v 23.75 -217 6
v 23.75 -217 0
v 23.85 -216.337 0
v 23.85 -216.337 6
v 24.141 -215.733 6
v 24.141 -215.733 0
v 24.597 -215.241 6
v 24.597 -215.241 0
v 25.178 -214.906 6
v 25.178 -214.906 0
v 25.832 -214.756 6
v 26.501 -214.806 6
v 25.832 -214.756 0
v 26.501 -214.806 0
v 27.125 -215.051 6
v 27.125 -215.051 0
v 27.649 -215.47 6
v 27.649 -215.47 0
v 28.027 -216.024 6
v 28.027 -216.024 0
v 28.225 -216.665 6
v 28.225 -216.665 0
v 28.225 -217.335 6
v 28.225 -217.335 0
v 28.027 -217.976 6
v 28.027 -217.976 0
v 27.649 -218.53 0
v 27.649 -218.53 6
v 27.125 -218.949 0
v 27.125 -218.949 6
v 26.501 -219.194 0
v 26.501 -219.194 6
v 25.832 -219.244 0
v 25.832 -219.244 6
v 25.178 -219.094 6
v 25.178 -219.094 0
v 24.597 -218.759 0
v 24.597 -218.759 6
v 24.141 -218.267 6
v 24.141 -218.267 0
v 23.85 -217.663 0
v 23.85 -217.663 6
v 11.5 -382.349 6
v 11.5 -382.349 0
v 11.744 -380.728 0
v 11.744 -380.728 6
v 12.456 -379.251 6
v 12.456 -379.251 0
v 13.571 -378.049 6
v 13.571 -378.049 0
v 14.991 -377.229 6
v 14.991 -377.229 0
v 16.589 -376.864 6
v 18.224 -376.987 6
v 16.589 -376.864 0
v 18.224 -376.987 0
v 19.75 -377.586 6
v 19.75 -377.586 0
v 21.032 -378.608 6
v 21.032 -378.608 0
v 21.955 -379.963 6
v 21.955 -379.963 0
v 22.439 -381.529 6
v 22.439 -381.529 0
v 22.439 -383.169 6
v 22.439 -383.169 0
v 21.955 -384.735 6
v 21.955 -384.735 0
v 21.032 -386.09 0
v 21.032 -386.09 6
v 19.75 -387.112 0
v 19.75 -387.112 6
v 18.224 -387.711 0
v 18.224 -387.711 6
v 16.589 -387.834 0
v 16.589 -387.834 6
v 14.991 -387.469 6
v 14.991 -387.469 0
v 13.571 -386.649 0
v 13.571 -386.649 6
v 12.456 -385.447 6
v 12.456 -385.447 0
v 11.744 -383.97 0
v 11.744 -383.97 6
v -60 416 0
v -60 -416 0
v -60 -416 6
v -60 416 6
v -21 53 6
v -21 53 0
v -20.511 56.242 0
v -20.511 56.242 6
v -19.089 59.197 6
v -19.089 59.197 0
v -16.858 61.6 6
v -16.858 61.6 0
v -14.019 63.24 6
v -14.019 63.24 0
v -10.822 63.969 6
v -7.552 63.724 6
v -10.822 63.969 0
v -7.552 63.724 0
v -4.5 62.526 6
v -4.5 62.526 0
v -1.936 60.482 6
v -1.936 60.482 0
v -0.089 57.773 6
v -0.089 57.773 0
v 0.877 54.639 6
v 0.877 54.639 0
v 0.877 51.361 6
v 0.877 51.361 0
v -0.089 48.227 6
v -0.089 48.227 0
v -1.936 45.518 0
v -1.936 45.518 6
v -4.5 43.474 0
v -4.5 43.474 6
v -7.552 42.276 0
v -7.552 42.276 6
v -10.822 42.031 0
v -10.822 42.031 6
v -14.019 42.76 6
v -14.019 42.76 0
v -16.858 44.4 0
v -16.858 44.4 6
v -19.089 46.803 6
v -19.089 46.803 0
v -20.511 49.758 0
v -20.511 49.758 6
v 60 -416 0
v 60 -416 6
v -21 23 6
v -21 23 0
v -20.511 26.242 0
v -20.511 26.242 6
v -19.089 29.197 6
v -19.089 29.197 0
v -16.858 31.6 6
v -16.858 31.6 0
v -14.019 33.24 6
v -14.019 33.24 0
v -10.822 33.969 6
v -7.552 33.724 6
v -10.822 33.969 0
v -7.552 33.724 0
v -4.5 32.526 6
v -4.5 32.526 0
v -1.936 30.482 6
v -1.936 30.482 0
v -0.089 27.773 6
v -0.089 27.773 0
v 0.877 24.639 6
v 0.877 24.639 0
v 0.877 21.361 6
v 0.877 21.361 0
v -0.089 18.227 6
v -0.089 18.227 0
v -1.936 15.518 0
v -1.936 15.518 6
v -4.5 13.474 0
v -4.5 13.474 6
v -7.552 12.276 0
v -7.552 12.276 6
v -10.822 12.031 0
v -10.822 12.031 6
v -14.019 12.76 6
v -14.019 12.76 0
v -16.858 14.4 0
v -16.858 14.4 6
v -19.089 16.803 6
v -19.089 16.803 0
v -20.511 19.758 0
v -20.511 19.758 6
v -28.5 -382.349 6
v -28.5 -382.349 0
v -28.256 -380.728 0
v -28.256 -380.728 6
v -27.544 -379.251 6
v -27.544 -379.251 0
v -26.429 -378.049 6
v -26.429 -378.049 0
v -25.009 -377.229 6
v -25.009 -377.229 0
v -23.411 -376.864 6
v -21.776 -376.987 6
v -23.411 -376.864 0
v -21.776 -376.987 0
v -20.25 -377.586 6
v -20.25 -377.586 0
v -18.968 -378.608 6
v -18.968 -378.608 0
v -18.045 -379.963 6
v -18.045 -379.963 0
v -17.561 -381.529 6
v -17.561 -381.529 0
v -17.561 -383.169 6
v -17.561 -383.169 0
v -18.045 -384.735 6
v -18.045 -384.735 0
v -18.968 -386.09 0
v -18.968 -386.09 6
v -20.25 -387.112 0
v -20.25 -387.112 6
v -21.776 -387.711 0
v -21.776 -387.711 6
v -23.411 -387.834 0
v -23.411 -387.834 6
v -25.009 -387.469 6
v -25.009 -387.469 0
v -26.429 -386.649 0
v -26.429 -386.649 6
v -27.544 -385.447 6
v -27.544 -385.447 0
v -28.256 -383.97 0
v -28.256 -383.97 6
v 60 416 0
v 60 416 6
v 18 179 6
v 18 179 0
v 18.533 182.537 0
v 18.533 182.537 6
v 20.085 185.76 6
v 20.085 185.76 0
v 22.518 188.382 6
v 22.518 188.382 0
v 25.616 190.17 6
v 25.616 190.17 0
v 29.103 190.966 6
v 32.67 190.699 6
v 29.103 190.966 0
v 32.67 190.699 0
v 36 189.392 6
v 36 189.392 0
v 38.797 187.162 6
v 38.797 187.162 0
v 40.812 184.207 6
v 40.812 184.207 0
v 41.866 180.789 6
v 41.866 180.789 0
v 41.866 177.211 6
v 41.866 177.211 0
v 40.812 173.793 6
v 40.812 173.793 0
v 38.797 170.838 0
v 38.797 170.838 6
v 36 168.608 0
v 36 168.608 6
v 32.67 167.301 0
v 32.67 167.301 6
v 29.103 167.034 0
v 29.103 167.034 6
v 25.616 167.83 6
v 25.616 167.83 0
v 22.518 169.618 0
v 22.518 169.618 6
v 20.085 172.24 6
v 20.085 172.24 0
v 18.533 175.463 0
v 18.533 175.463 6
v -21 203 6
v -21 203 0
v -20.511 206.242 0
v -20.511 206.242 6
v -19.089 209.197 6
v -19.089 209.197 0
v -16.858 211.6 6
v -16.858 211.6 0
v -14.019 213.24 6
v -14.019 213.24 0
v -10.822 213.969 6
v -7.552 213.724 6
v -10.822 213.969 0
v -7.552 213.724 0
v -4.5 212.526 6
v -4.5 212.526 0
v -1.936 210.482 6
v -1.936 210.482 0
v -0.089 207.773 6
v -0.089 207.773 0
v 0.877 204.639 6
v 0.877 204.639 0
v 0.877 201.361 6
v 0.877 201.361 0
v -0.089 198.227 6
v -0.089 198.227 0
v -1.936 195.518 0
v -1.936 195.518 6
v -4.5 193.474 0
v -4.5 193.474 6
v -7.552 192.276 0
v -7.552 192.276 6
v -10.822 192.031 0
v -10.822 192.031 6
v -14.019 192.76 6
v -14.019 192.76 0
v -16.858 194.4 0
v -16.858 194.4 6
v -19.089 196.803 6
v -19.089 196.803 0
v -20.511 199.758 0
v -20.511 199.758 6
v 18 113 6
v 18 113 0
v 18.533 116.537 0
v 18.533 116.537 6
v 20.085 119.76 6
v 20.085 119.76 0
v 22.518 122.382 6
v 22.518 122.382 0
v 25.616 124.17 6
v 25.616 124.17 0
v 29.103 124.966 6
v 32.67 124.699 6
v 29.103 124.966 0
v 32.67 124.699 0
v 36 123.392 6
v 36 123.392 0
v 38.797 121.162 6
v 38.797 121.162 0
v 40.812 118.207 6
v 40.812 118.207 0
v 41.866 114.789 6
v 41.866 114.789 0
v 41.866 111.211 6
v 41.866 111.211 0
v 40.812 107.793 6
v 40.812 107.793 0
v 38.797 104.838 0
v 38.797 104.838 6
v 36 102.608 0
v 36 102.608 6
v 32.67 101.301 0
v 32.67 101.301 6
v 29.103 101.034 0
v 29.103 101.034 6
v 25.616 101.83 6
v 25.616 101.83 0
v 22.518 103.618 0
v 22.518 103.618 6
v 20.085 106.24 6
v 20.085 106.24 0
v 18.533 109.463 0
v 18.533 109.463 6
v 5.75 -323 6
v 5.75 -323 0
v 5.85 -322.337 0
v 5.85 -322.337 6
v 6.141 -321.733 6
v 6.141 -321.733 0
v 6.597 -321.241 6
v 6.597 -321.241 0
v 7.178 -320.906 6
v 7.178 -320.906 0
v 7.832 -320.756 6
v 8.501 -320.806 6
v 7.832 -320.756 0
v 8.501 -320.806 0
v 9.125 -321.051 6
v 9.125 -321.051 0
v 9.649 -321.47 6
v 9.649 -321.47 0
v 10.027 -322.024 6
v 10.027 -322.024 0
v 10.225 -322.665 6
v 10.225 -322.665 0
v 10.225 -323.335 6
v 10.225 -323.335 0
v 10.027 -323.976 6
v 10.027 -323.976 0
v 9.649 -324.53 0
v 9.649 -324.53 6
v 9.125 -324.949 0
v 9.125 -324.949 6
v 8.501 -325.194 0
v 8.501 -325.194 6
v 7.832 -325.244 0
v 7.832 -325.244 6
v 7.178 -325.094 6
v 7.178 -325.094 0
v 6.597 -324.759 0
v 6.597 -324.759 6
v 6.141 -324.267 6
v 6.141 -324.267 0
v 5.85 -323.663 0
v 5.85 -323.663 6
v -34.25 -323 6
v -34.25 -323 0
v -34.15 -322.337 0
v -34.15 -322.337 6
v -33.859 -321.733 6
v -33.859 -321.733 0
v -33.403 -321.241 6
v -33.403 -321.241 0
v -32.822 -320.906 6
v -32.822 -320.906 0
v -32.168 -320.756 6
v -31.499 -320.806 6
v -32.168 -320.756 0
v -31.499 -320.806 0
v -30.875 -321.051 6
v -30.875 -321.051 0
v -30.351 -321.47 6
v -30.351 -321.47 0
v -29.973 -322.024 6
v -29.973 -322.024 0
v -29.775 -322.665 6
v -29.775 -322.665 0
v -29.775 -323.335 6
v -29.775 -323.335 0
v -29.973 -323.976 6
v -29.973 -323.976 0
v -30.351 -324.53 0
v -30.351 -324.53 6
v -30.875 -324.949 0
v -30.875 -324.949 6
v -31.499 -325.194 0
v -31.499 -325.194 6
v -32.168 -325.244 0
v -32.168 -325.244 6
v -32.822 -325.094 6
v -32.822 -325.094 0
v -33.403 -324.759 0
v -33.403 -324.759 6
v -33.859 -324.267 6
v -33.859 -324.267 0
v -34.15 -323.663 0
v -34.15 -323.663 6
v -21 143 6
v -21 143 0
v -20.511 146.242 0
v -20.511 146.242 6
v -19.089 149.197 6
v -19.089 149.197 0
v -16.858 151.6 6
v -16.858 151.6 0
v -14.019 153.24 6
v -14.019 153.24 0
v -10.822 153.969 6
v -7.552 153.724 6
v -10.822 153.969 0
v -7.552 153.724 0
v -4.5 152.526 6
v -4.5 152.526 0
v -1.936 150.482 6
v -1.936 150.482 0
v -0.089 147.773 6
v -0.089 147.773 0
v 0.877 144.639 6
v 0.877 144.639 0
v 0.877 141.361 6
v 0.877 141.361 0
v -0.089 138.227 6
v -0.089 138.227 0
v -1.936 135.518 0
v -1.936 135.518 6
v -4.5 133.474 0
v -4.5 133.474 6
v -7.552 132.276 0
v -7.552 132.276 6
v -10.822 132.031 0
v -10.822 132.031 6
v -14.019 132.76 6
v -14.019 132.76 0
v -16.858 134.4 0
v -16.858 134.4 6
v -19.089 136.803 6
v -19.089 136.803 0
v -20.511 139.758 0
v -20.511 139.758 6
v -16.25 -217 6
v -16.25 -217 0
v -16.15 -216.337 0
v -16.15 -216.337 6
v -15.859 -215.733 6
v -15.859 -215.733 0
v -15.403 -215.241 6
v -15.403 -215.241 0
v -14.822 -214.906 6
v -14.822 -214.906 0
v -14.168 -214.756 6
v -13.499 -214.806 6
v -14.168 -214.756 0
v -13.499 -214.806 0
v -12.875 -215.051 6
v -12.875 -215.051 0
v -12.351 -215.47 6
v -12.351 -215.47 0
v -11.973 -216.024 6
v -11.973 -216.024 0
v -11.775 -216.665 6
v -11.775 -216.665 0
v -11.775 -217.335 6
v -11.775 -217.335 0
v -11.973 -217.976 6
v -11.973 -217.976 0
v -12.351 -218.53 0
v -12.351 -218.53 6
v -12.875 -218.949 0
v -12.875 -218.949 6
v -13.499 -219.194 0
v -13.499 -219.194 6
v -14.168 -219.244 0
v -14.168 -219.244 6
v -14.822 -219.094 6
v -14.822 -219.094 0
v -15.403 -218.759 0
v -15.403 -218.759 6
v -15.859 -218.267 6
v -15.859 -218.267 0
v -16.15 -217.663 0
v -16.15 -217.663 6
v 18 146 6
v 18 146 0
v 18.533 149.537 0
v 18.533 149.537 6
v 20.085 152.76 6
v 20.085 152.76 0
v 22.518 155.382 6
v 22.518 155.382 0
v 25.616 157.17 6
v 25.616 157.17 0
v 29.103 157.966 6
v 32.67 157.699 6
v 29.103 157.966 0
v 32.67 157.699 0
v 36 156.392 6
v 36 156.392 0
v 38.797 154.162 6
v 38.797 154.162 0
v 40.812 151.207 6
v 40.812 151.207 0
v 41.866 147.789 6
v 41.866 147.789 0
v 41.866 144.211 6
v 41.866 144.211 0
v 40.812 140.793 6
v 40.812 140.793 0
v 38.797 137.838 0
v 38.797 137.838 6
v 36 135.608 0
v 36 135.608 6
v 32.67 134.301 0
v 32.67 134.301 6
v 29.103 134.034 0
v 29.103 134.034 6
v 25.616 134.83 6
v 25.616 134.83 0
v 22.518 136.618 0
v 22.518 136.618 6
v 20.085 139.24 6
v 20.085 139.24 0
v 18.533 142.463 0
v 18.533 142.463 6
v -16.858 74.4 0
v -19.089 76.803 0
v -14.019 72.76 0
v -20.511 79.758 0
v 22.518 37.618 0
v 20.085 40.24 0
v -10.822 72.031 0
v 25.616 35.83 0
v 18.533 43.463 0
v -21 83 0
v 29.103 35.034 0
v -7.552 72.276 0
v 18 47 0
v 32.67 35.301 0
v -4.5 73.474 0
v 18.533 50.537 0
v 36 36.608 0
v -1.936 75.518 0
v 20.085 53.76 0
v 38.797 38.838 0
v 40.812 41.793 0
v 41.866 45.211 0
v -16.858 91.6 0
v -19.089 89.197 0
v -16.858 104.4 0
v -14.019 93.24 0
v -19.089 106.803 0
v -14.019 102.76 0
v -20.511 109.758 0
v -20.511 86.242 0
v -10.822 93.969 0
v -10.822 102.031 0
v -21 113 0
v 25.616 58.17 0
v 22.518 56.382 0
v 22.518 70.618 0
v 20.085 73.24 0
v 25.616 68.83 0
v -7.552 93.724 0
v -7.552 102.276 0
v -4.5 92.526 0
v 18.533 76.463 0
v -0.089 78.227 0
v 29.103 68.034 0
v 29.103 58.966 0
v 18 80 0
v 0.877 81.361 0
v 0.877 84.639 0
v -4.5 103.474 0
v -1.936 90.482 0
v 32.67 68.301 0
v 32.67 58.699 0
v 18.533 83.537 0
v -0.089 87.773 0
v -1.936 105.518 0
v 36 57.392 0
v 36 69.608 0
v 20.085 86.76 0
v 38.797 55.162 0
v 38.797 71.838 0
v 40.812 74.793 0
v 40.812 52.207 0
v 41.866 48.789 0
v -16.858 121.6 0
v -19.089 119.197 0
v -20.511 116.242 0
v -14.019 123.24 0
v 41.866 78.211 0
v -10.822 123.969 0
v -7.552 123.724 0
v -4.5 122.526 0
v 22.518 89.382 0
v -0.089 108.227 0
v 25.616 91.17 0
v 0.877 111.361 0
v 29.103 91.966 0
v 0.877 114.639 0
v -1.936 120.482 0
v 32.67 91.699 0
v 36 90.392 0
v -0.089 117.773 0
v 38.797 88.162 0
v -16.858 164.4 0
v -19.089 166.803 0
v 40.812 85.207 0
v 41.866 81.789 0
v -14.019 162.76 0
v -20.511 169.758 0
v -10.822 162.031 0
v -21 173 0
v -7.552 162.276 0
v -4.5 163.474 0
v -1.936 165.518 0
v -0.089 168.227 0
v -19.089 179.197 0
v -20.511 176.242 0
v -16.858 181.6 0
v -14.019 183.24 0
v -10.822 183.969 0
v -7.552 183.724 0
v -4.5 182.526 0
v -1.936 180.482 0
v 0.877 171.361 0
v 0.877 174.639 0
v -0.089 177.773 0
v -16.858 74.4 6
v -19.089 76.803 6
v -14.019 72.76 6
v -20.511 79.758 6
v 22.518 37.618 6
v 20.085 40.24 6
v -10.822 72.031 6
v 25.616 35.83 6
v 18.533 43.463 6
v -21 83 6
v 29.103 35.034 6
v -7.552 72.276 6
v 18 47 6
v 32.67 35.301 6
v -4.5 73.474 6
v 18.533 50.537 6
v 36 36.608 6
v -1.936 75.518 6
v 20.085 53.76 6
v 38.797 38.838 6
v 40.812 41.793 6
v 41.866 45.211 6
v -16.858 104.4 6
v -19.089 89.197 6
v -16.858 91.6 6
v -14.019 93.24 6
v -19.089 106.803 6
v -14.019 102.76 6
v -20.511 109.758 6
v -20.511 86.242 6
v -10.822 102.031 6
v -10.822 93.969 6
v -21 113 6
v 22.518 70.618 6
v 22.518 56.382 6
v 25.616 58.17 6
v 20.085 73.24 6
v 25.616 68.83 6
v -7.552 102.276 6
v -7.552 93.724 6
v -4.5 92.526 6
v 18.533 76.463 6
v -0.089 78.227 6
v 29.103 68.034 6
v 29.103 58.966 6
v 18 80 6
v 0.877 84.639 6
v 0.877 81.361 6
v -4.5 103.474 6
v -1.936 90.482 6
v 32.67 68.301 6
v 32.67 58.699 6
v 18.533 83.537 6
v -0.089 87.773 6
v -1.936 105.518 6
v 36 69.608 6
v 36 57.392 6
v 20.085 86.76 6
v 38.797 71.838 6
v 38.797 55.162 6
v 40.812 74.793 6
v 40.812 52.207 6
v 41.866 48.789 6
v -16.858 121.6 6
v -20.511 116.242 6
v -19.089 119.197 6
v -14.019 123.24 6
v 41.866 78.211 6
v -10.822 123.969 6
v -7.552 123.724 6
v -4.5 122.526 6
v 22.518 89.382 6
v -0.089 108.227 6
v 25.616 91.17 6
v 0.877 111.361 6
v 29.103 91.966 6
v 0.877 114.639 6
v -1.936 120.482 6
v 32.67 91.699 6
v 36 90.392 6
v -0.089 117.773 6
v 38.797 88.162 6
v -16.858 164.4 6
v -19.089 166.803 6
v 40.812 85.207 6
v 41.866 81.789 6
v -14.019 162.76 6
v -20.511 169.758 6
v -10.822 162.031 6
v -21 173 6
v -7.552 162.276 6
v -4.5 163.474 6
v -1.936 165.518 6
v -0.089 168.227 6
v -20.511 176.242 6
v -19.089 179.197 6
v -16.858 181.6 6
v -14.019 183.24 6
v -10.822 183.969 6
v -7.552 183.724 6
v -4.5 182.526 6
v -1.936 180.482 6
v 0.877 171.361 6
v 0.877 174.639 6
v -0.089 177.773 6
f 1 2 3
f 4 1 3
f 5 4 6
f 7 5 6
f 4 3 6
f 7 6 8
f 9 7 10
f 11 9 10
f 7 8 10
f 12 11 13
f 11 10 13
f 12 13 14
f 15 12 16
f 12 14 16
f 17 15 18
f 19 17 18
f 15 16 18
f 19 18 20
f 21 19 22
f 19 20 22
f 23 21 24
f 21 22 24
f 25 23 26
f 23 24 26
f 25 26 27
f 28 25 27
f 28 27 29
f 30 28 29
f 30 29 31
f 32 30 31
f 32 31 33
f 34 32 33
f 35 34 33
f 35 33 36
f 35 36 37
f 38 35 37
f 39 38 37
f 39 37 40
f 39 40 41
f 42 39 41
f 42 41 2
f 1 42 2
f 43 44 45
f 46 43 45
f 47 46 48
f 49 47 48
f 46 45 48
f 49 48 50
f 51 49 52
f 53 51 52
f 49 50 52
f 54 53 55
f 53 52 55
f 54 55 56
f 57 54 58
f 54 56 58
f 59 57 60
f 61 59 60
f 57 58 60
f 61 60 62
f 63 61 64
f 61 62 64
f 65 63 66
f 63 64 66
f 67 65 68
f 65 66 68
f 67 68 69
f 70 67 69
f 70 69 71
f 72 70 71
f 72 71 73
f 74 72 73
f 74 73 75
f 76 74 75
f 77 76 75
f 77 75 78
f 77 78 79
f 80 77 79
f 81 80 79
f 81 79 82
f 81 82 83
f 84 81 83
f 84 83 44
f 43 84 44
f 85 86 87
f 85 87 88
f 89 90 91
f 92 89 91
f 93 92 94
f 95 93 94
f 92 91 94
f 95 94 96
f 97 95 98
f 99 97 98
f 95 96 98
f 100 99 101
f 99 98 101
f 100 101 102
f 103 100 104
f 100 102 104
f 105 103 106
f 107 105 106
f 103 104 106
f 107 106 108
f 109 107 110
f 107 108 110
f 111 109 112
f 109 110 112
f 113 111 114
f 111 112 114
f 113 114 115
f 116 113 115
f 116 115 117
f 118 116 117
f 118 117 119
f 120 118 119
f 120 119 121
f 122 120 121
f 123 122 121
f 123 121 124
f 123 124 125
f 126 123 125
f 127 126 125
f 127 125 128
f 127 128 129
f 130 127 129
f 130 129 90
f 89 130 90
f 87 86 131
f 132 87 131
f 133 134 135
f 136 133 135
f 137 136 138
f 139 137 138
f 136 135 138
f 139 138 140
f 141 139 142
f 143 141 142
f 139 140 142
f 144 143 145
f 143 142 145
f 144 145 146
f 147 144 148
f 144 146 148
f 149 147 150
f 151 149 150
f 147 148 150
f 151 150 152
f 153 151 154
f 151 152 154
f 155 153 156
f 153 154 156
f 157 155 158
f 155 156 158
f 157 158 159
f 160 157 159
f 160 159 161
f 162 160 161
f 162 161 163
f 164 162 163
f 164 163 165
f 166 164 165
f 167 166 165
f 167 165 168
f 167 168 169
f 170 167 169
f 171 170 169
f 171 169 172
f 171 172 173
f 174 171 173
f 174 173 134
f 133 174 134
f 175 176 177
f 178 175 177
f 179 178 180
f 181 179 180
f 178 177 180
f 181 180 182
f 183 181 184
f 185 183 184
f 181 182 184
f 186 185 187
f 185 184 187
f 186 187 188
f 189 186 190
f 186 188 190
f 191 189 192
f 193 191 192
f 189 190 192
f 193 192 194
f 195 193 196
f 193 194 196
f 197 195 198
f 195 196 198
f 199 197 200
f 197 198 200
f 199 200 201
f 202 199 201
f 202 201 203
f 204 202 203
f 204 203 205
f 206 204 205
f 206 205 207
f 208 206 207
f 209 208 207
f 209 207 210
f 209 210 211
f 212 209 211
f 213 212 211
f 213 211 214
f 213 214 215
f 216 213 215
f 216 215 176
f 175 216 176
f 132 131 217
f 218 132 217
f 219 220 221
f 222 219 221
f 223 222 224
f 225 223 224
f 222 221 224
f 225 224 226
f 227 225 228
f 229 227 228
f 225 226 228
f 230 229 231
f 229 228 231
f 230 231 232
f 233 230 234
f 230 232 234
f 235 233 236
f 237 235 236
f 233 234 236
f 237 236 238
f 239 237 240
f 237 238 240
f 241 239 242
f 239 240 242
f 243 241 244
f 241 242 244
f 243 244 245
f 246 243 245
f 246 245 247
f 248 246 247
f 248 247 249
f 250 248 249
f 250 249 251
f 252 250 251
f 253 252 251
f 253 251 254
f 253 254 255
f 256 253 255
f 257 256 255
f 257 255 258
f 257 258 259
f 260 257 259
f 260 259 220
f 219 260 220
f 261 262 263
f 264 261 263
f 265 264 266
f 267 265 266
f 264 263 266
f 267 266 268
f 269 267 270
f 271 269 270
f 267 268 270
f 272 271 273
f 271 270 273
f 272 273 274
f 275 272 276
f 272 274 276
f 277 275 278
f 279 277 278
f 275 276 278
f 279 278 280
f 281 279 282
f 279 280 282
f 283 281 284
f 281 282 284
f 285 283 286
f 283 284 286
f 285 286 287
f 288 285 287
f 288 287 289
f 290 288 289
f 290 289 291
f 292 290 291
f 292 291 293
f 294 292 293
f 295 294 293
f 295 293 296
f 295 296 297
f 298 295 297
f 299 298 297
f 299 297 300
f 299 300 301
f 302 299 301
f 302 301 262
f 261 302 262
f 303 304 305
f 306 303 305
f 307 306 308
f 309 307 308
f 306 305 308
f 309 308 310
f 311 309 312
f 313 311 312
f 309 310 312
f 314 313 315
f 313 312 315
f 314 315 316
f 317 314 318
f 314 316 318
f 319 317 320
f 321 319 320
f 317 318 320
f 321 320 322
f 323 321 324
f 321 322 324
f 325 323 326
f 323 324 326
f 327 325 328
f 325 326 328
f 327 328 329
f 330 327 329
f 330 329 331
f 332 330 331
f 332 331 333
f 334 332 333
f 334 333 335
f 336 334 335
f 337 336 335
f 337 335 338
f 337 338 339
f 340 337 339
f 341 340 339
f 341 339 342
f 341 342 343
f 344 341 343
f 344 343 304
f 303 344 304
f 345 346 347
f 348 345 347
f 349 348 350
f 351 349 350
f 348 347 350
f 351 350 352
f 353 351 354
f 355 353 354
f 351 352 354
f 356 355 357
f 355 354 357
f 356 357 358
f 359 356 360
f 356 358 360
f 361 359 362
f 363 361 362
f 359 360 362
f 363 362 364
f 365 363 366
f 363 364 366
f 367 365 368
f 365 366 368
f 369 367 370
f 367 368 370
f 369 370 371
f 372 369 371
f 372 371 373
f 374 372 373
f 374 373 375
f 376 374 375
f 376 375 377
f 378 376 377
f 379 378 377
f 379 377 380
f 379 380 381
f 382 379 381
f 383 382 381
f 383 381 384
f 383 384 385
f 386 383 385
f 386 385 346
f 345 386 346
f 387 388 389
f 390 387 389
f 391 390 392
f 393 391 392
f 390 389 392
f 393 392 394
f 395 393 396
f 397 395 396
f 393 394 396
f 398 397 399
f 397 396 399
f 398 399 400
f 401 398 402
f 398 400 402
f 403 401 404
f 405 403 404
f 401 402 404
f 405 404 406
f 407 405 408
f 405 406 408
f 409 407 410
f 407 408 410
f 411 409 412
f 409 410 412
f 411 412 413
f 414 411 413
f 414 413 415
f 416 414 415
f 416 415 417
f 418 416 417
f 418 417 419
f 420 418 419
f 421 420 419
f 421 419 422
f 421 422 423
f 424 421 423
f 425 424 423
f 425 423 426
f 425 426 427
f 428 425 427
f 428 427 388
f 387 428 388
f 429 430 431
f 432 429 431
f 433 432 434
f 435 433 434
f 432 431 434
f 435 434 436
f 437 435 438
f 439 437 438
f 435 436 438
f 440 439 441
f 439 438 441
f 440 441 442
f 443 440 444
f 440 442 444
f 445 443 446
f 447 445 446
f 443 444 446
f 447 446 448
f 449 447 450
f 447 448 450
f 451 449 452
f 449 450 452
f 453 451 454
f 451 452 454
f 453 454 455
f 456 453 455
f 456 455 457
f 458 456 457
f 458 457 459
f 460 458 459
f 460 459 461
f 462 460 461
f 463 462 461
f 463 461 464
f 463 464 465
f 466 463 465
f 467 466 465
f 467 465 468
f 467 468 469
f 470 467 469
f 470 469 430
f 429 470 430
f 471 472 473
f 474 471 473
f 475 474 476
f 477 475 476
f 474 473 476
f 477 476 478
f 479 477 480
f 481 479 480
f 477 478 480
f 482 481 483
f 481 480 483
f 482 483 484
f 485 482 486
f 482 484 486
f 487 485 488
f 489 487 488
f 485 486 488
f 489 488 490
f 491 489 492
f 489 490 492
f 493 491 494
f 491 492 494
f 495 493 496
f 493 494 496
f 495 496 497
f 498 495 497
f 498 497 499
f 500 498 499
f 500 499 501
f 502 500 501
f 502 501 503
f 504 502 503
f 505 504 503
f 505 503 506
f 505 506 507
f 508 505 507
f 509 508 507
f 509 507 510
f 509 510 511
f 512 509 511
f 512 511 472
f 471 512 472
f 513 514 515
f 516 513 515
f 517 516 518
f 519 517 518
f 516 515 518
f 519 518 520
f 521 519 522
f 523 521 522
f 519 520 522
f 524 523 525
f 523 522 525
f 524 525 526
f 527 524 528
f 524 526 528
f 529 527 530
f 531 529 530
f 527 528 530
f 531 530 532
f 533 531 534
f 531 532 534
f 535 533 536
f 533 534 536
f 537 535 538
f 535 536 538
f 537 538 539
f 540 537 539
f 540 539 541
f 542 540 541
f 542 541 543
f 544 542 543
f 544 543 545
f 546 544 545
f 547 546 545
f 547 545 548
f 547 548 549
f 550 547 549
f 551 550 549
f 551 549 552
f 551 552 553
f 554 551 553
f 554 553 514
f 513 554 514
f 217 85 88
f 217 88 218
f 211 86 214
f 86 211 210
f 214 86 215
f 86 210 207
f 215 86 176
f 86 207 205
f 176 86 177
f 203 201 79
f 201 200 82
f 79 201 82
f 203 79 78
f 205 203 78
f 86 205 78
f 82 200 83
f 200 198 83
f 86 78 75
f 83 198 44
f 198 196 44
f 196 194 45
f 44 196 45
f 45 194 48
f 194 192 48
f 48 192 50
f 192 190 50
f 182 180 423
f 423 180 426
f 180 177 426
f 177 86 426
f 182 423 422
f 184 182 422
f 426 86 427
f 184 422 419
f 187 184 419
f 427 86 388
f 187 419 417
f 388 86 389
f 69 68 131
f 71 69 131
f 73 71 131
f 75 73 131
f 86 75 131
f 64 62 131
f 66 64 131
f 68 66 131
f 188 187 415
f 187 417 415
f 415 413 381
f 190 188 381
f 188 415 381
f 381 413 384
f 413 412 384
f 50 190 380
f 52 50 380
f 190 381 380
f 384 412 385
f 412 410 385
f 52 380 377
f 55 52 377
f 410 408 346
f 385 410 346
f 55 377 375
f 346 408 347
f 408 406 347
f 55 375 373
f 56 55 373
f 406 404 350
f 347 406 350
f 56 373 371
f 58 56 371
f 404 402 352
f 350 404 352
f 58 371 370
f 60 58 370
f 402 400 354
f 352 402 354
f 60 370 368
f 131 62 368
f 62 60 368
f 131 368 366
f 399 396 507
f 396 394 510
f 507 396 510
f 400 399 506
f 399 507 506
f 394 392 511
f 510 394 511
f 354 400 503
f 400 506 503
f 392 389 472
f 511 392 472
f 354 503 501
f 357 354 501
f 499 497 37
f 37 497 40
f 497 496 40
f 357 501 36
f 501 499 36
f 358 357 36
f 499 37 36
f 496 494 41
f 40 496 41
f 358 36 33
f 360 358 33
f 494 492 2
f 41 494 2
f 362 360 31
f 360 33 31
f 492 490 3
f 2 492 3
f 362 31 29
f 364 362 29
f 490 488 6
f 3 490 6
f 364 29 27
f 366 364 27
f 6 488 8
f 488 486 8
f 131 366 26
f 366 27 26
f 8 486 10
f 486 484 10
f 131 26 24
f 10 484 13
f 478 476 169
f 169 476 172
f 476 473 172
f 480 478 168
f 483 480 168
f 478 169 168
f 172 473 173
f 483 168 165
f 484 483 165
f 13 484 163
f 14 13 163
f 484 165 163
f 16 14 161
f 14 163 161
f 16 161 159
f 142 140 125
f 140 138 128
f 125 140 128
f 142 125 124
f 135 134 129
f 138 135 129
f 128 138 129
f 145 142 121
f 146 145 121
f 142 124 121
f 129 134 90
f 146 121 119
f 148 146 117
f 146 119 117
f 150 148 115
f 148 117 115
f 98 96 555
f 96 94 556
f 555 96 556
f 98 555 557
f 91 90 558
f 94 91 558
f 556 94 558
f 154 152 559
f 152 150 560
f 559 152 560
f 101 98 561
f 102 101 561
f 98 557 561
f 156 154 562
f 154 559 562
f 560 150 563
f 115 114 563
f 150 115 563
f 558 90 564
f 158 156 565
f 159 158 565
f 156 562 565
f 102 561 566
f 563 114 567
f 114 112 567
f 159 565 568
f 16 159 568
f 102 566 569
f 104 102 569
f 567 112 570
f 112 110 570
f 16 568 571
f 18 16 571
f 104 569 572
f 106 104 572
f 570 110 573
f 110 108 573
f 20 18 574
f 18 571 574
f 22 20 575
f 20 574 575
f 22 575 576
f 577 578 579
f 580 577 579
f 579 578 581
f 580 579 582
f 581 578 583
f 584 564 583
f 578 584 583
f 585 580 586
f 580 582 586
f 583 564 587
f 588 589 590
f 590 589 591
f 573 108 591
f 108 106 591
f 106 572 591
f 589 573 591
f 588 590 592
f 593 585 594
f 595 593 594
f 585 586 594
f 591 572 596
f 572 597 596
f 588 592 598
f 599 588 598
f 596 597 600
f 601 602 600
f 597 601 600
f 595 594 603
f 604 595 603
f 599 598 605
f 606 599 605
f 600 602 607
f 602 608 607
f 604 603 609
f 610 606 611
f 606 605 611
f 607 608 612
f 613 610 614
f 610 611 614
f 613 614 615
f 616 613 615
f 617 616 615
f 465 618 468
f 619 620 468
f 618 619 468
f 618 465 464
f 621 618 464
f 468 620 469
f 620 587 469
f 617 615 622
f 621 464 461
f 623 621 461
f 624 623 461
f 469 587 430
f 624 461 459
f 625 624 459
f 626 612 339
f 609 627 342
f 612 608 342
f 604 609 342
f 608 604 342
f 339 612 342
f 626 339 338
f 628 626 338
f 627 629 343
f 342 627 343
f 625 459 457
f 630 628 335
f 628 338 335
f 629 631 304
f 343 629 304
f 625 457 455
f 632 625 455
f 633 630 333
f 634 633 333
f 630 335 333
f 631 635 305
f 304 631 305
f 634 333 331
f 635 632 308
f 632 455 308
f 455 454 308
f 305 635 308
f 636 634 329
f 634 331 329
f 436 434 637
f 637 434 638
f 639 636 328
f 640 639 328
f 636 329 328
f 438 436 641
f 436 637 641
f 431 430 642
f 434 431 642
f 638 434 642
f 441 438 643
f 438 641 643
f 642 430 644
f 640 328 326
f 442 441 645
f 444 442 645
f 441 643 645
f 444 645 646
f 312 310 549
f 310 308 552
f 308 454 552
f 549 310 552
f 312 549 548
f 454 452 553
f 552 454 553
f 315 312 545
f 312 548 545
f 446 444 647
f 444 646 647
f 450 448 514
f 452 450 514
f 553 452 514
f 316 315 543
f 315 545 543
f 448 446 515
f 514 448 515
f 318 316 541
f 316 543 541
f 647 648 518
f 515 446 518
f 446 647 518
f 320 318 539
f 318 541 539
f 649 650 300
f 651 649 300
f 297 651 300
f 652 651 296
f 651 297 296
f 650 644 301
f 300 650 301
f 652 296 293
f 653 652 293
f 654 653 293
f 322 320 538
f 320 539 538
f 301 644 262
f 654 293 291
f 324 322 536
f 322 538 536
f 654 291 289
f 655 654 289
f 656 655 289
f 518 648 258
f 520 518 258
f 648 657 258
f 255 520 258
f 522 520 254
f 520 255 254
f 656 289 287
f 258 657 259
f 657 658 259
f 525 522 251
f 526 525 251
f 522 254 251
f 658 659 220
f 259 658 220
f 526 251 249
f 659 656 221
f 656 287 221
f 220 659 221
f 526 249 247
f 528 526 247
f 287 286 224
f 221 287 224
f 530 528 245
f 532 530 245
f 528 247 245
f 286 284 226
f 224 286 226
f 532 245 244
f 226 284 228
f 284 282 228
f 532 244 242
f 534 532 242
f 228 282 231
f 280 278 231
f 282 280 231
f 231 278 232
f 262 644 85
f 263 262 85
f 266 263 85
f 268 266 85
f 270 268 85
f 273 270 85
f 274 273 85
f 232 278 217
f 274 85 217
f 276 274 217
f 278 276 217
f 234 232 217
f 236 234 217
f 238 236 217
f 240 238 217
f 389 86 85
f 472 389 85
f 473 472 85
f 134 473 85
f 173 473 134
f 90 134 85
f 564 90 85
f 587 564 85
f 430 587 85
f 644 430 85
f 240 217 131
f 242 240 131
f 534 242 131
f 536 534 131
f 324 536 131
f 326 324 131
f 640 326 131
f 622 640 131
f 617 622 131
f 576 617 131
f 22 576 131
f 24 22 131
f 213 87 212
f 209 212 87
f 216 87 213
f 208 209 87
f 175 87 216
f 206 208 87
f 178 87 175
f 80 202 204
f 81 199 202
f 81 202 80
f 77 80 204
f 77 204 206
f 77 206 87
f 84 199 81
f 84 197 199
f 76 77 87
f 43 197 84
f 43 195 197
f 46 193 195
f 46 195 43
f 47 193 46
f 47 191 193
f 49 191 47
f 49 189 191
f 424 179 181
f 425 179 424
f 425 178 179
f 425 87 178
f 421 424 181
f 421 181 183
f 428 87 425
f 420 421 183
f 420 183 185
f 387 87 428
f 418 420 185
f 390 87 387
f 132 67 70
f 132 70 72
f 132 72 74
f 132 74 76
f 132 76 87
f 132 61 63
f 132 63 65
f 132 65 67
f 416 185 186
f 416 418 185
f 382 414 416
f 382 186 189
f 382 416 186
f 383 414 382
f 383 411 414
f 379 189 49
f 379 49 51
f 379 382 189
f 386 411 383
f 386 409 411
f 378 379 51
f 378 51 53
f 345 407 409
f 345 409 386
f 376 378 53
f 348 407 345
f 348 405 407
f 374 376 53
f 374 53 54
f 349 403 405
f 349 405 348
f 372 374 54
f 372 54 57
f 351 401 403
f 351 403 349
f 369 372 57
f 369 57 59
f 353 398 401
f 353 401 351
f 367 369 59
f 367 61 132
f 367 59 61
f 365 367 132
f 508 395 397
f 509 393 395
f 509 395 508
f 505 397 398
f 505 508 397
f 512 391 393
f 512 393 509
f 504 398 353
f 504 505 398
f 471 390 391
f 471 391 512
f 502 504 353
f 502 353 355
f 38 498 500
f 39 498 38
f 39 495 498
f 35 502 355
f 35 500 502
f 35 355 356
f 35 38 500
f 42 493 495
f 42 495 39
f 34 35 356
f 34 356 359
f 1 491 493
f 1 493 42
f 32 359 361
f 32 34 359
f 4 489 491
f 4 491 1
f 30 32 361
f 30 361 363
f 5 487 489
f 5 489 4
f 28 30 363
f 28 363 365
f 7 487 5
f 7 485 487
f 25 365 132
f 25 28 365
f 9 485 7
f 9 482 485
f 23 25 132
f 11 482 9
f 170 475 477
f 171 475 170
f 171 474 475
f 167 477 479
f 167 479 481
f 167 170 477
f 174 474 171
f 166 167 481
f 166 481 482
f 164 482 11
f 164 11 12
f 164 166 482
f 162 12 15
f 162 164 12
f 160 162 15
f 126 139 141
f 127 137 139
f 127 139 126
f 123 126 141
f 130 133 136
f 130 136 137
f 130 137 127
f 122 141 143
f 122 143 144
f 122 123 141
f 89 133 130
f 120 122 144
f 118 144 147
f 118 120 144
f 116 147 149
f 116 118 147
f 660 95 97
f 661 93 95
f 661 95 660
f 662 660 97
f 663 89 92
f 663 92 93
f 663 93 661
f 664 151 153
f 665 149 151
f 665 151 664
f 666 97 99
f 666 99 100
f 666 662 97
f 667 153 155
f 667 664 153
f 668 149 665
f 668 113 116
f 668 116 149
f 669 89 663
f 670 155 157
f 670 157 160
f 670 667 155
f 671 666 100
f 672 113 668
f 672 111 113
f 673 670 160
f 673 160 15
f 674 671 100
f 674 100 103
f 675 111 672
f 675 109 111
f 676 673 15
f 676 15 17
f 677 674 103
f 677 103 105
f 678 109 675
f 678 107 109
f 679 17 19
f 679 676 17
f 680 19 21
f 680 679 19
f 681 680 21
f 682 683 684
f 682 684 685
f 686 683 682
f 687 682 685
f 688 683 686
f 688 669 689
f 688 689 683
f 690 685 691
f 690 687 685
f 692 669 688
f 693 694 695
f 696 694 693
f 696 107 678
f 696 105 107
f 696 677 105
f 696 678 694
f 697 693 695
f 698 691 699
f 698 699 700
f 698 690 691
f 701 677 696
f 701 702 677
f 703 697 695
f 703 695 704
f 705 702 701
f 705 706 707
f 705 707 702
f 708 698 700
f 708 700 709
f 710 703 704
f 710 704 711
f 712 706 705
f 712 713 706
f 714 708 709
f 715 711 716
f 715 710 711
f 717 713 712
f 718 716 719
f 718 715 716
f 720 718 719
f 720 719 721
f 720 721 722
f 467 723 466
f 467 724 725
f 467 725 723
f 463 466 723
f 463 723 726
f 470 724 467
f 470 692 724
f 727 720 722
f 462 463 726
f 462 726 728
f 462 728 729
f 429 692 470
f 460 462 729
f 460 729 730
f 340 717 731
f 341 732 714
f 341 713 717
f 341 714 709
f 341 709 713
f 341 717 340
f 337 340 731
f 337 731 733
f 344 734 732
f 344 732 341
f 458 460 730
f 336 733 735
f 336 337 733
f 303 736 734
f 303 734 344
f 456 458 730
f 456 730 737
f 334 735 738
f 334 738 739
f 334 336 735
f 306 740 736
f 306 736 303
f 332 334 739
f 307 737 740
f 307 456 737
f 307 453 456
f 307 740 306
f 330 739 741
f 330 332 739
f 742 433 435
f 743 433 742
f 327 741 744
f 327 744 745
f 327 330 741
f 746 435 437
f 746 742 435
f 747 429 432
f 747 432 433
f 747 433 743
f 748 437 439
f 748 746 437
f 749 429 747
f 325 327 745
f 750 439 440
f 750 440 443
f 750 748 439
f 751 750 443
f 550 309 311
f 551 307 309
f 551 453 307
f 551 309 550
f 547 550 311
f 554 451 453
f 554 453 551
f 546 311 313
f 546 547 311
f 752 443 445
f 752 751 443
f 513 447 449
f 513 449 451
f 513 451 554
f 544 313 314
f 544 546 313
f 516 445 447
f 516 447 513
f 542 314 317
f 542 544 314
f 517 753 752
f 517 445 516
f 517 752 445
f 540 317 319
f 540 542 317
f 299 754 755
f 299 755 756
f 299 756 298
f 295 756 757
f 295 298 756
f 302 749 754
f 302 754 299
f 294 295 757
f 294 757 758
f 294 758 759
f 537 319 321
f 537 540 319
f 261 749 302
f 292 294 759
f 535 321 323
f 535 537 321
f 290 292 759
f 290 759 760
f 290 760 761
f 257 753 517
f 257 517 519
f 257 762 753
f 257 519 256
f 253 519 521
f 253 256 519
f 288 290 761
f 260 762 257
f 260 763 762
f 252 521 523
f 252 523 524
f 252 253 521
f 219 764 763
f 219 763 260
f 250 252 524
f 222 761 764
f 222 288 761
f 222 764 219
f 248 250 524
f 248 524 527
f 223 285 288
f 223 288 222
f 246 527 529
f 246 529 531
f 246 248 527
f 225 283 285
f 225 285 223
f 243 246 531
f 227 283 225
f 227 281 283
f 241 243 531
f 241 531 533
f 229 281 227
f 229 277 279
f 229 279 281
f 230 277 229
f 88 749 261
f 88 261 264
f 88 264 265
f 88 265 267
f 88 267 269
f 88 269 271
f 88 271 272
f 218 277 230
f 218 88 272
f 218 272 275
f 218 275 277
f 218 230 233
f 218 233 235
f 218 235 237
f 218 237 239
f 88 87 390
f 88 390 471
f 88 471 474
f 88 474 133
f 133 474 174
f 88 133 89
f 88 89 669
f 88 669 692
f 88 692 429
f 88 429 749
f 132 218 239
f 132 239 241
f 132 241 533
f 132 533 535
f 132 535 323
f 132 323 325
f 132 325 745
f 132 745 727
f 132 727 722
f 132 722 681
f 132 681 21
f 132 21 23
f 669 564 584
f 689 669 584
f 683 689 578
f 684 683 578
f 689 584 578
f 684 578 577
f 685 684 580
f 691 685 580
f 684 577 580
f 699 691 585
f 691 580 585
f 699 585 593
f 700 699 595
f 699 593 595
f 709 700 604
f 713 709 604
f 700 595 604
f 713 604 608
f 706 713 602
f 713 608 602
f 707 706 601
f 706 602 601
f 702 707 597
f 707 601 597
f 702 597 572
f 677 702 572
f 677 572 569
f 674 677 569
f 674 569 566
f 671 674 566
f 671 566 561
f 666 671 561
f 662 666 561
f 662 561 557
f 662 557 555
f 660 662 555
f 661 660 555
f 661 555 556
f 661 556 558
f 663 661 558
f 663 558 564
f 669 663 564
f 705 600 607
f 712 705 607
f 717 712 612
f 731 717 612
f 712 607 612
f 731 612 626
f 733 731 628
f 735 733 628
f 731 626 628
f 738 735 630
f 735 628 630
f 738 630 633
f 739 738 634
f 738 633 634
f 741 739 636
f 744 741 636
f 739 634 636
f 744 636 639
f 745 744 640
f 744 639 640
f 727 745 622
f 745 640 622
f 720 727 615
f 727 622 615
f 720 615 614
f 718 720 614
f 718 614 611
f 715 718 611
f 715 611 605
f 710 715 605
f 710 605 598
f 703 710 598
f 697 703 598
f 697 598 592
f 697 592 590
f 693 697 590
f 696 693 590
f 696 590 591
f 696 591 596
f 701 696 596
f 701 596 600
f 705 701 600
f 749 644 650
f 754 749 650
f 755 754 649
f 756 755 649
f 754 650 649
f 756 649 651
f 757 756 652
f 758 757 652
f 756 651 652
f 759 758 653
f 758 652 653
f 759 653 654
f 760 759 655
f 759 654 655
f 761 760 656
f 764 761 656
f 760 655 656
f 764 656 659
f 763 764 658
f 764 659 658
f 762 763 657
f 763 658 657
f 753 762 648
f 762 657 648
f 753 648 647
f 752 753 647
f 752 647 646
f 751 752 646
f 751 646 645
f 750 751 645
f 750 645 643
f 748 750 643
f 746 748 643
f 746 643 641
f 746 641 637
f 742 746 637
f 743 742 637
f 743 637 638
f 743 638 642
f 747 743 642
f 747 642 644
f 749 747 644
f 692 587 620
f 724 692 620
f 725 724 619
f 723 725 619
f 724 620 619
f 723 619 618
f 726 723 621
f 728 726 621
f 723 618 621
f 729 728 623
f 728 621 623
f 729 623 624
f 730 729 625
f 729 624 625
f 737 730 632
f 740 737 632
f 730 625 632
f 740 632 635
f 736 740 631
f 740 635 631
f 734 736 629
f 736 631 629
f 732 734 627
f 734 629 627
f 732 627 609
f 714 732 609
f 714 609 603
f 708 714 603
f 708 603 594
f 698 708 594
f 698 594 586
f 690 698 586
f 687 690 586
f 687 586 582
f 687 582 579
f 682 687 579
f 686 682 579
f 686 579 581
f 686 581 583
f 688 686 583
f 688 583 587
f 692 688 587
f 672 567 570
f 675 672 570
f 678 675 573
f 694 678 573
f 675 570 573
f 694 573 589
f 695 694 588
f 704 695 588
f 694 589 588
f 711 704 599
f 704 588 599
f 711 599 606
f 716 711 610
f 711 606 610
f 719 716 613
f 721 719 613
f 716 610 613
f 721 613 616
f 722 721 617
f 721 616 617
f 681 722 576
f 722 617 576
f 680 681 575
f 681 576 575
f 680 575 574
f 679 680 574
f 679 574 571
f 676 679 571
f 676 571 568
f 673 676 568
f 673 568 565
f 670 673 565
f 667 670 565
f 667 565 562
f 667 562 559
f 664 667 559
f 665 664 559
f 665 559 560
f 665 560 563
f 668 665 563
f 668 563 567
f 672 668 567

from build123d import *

# Parameters (mm, degrees)
ESQUISSE1_W           = 120
ESQUISSE1_H           = 832
BOSS_EXTRU_1_DEPTH    = 6
M10_CLEARANCE_HOLE1_D = 11
M4_CLEARANCE_HOLE1_D  = 4.5
SKETCH5_R             = 3
CUT_EXTRUDE1_DEPTH    = 10
M20_CLEARANCE_HOLE1_D = 22
M22_CLEARANCE_HOLE1_D = 24
LPATTERN1_COUNT       = 4
LPATTERN1_PITCH       = 30
LPATTERN2_COUNT       = 3
LPATTERN2_PITCH       = 33
LPATTERN3_COUNT       = 3
LPATTERN3_PITCH       = 33
LPATTERN4_COUNT       = 4
LPATTERN4_PITCH       = 30


with BuildPart() as part:
    # Esquisse1 → Boss.-Extru.1 (new body)
    with BuildSketch(Plane.XY):
        Rectangle(ESQUISSE1_W, ESQUISSE1_H)
    extrude(amount=BOSS_EXTRU_1_DEPTH)

    # M10 Clearance Hole1 (through all)
    with Locations(Plane.XY.offset(6)):
        with Locations((17, -382.348938989), (-23, -382.348938989)):
            Hole(M10_CLEARANCE_HOLE1_D / 2)

    # M4 Clearance Hole1 (through all)
    with Locations(Plane.XY.offset(6)):
        with Locations((26, -217), (8, -323), (-32, -323), (-14, -217)):
            Hole(M4_CLEARANCE_HOLE1_D / 2)

    # Sketch5 → Cut-Extrude1 (cut)
    with BuildSketch(Plane.XY.offset(6)):
        with Locations((30, 113)):
            Circle(SKETCH5_R)
        with Locations((-10, 113)):
            Circle(SKETCH5_R)
    extrude(amount=-CUT_EXTRUDE1_DEPTH, mode=Mode.SUBTRACT)

    # M20 Clearance Hole1 (through all)
    with Locations(Plane.XY.offset(6)):
        with Locations((-10, 113)):
            m20_clearance_hole1 = Hole(M20_CLEARANCE_HOLE1_D / 2)

    # M22 Clearance Hole1 (through all)
    with Locations(Plane.XY.offset(6)):
        with Locations((30, 113)):
            m22_clearance_hole1 = Hole(M22_CLEARANCE_HOLE1_D / 2)

    # LPattern1: M20 Clearance Hole1 ×4
    with Locations(*[(0, i * LPATTERN1_PITCH, 0) for i in range(1, LPATTERN1_COUNT)]):
        add(m20_clearance_hole1, mode=Mode.SUBTRACT)

    # LPattern2: M22 Clearance Hole1 ×3
    with Locations(*[(0, i * LPATTERN2_PITCH, 0) for i in range(1, LPATTERN2_COUNT)]):
        add(m22_clearance_hole1, mode=Mode.SUBTRACT)

    # LPattern3: M22 Clearance Hole1 ×3
    with Locations(*[(0, -i * LPATTERN3_PITCH, 0) for i in range(1, LPATTERN3_COUNT)]):
        add(m22_clearance_hole1, mode=Mode.SUBTRACT)

    # LPattern4: M20 Clearance Hole1 ×4
    with Locations(*[(0, -i * LPATTERN4_PITCH, 0) for i in range(1, LPATTERN4_COUNT)]):
        add(m20_clearance_hole1, mode=Mode.SUBTRACT)


solid = part.part
